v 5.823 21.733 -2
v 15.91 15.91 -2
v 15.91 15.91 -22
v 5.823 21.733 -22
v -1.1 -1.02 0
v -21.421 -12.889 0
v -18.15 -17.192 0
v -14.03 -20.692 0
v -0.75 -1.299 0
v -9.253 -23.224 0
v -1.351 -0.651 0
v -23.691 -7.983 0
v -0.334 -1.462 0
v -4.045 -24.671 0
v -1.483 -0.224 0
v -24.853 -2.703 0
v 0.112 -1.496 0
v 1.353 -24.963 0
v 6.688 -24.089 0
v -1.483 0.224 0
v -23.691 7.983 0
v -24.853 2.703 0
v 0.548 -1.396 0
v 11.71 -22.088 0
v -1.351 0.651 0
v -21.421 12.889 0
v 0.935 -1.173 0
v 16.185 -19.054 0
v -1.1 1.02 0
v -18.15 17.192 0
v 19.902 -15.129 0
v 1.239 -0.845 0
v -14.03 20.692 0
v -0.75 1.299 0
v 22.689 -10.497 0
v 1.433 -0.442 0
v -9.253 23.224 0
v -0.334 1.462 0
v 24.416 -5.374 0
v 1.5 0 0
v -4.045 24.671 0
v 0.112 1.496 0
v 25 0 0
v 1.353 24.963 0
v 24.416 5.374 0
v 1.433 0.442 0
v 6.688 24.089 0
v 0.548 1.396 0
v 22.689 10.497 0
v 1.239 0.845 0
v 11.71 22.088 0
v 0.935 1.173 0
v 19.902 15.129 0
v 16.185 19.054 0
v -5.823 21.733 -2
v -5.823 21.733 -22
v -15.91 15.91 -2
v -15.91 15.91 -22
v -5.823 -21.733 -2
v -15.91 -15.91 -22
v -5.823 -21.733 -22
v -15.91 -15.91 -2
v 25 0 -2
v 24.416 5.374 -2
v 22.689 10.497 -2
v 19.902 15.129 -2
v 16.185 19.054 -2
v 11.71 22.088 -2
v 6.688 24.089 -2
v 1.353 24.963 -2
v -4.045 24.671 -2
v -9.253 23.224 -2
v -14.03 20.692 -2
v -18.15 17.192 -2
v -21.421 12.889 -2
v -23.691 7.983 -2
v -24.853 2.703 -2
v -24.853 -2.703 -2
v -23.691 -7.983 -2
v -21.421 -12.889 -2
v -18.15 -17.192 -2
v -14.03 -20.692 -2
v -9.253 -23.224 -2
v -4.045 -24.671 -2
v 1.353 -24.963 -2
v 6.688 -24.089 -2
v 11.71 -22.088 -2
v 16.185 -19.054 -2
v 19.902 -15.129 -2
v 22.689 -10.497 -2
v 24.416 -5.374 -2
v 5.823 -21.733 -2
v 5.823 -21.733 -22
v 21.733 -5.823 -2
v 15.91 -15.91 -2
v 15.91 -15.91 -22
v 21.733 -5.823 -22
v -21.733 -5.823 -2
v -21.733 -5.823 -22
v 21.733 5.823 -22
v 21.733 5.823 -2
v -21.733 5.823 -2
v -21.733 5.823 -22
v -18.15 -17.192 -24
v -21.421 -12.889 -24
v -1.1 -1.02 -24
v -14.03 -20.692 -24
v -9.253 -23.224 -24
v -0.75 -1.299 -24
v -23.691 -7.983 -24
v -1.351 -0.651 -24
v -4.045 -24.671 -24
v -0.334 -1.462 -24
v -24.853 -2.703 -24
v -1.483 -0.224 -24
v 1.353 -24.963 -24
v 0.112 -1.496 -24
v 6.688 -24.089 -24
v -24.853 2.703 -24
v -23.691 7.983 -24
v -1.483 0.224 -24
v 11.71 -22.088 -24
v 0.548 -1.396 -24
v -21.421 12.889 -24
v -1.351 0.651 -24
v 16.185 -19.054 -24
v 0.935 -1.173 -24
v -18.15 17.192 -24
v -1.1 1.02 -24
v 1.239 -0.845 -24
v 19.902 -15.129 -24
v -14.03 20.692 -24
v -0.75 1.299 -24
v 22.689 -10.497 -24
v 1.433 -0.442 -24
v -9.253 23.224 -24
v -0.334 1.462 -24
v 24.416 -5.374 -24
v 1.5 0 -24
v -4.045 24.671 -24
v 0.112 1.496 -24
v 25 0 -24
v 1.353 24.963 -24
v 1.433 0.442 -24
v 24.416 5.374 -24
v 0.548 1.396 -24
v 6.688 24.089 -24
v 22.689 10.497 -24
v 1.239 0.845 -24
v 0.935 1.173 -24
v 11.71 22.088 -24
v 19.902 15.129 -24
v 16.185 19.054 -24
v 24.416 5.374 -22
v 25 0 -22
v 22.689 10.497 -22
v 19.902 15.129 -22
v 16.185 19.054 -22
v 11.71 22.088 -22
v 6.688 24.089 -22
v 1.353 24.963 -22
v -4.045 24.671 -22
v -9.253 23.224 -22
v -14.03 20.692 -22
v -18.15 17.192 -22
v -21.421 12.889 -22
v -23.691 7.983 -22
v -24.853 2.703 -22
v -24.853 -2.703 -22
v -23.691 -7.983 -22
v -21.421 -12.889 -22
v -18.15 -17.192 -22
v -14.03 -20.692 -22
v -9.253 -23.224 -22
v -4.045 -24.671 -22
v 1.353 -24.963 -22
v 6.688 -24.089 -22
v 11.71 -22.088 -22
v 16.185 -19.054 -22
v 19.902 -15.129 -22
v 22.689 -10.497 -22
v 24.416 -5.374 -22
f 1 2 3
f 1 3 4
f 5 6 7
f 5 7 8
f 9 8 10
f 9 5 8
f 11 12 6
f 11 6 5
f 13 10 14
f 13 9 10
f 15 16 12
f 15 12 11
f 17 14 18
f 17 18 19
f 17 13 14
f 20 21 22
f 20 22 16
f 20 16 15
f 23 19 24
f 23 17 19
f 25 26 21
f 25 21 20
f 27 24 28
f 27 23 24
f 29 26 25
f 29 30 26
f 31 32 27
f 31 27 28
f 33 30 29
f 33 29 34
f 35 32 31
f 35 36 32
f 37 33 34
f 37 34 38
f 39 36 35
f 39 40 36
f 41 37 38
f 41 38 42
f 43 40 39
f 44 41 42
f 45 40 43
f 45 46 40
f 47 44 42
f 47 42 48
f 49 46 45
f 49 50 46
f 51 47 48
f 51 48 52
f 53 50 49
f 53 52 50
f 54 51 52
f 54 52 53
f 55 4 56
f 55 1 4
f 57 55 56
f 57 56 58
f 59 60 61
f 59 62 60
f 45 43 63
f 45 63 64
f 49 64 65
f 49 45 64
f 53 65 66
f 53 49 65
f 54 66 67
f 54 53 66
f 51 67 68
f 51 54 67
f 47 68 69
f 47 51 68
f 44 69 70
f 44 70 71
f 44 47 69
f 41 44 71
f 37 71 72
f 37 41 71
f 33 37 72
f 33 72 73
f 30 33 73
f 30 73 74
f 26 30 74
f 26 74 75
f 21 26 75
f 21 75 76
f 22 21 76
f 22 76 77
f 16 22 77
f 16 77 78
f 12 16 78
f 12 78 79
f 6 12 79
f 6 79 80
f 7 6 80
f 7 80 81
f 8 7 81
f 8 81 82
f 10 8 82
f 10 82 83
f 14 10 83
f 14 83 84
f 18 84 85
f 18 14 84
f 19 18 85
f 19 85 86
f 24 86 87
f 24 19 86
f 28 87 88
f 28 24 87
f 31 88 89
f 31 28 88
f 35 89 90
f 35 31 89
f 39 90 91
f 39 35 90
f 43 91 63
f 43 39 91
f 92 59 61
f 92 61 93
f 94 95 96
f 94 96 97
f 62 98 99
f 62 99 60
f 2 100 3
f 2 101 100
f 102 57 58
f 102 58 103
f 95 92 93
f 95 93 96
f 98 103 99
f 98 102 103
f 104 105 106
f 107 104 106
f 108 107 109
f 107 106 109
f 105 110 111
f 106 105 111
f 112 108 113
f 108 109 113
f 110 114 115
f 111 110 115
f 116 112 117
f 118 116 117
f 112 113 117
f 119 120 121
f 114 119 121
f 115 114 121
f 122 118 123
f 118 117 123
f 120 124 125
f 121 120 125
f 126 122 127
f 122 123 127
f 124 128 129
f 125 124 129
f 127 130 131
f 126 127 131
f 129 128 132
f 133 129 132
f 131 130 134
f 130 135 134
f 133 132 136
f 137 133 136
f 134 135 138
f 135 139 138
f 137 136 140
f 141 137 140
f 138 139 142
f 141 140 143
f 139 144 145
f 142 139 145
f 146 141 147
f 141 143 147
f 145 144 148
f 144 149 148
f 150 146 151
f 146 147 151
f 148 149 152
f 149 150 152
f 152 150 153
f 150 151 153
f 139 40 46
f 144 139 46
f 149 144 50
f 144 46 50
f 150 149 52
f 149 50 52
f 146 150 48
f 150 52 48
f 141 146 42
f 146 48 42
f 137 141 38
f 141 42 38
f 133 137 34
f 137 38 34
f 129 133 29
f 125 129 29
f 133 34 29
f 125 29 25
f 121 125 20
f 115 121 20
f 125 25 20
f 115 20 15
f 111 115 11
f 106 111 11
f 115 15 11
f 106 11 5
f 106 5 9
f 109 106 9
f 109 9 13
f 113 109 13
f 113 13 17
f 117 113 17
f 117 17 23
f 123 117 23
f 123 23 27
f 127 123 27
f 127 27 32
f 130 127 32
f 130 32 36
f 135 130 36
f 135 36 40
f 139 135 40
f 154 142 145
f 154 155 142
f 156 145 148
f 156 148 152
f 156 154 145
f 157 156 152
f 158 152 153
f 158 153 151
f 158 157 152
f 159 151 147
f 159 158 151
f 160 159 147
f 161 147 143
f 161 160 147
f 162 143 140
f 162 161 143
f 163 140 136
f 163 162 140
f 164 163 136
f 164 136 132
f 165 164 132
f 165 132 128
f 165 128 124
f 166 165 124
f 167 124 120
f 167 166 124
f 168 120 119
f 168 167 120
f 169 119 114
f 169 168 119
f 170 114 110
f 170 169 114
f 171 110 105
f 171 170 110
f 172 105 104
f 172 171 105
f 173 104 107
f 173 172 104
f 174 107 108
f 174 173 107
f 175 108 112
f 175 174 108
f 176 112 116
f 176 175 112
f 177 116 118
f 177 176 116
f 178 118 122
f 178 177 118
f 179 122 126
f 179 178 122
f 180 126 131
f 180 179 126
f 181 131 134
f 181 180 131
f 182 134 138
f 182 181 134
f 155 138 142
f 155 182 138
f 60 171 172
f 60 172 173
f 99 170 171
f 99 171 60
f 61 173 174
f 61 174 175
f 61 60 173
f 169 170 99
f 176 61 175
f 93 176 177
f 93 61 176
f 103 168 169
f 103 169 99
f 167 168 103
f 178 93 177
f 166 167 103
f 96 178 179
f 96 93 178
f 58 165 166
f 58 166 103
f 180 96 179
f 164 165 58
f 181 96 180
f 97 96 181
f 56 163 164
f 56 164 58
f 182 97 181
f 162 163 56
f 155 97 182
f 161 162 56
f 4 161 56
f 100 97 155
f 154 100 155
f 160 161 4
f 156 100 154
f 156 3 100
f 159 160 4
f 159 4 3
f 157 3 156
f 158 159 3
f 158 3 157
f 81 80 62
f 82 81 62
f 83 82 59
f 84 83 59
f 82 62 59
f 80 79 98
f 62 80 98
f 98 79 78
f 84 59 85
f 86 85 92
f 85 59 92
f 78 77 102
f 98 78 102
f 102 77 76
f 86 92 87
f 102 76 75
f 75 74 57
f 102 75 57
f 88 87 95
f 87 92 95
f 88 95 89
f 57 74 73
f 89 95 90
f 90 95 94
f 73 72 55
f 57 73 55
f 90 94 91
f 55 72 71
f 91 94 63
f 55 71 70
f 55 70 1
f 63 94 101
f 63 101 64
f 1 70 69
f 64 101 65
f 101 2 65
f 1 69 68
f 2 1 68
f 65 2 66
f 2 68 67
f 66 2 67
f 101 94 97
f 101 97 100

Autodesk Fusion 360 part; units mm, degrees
sketch "Sketch1" plane through (0, 0, 0) normal (0, 0, 1) x (1, 0, 0)
  circle A0 centre (0, 0) radius 25
  circle A1 centre (0, 0) radius 22.5
  circle A2 centre (0, 0) radius 1.5
  line L0 (-0.912, -1.1909) -> (0.912, -1.1909)
  line L1 (5.8234, 21.7333) -> (-5.8234, 21.7333)
  line L2 (-5.8234, 21.7333) -> (-15.9099, 15.9099)
  line L3 (-15.9099, 15.9099) -> (-21.7333, 5.8234)
  line L4 (-21.7333, 5.8234) -> (-21.7333, -5.8234)
  line L5 (-21.7333, -5.8234) -> (-15.9099, -15.9099)
  line L6 (-15.9099, -15.9099) -> (-5.8234, -21.7333)
  line L7 (-5.8234, -21.7333) -> (5.8234, -21.7333)
  line L8 (5.8234, -21.7333) -> (15.9099, -15.9099)
  line L9 (15.9099, -15.9099) -> (21.7333, -5.8234)
  line L10 (21.7333, -5.8234) -> (21.7333, 5.8234)
  line L11 (21.7333, 5.8234) -> (15.9099, 15.9099)
  line L12 (15.9099, 15.9099) -> (5.8234, 21.7333)
  line L13 (1.75, 0) -> (22.5, 0)
  dimension "d2" = 50
  dimension "d3" = 45
  dimension "d4" = 3
  dimension "d5" = 1.824
  dimension "d38" = 2.5
  dimension "d42" = 22.5
extrude "Extrude6" add sketch "Sketch1" against normal blind 2 contours A0 | A1 L10 L13 | A1 L10 L13 | A1 L11 | L1 L2 L3 L4 L5 L6 L7 L8 L9 L10 L11 L12 | A1 L9 | A1 L12 | A1 L8 | A1 L1 | A1 L7 | A1 L2 | A1 L6 | A1 L3 | A1 L5 | A1 L4
extrude "Extrude7" add sketch "Sketch1" against normal blind 22 contours L1 L2 L3 L4 L5 L6 L7 L8 L9 L10 L11 L12
extrude "Extrude8" add sketch "Sketch1" along normal blind -24 and the other way blind 22 contours A0 | A1 L10 L13 | A1 L10 L13 | A1 L11 | L1 L2 L3 L4 L5 L6 L7 L8 L9 L10 L11 L12 | A1 L9 | A1 L12 | A1 L8 | A1 L1 | A1 L7 | A1 L2 | A1 L6 | A1 L3 | A1 L5 | A1 L4
equation "OuterDim = 50 mm"
equation "d2 = OuterDim"
equation "d3 = OuterDim * 0.9"
equation "Width = 20 mm"
equation "d42 = OuterDim * 0.9 / 2"
